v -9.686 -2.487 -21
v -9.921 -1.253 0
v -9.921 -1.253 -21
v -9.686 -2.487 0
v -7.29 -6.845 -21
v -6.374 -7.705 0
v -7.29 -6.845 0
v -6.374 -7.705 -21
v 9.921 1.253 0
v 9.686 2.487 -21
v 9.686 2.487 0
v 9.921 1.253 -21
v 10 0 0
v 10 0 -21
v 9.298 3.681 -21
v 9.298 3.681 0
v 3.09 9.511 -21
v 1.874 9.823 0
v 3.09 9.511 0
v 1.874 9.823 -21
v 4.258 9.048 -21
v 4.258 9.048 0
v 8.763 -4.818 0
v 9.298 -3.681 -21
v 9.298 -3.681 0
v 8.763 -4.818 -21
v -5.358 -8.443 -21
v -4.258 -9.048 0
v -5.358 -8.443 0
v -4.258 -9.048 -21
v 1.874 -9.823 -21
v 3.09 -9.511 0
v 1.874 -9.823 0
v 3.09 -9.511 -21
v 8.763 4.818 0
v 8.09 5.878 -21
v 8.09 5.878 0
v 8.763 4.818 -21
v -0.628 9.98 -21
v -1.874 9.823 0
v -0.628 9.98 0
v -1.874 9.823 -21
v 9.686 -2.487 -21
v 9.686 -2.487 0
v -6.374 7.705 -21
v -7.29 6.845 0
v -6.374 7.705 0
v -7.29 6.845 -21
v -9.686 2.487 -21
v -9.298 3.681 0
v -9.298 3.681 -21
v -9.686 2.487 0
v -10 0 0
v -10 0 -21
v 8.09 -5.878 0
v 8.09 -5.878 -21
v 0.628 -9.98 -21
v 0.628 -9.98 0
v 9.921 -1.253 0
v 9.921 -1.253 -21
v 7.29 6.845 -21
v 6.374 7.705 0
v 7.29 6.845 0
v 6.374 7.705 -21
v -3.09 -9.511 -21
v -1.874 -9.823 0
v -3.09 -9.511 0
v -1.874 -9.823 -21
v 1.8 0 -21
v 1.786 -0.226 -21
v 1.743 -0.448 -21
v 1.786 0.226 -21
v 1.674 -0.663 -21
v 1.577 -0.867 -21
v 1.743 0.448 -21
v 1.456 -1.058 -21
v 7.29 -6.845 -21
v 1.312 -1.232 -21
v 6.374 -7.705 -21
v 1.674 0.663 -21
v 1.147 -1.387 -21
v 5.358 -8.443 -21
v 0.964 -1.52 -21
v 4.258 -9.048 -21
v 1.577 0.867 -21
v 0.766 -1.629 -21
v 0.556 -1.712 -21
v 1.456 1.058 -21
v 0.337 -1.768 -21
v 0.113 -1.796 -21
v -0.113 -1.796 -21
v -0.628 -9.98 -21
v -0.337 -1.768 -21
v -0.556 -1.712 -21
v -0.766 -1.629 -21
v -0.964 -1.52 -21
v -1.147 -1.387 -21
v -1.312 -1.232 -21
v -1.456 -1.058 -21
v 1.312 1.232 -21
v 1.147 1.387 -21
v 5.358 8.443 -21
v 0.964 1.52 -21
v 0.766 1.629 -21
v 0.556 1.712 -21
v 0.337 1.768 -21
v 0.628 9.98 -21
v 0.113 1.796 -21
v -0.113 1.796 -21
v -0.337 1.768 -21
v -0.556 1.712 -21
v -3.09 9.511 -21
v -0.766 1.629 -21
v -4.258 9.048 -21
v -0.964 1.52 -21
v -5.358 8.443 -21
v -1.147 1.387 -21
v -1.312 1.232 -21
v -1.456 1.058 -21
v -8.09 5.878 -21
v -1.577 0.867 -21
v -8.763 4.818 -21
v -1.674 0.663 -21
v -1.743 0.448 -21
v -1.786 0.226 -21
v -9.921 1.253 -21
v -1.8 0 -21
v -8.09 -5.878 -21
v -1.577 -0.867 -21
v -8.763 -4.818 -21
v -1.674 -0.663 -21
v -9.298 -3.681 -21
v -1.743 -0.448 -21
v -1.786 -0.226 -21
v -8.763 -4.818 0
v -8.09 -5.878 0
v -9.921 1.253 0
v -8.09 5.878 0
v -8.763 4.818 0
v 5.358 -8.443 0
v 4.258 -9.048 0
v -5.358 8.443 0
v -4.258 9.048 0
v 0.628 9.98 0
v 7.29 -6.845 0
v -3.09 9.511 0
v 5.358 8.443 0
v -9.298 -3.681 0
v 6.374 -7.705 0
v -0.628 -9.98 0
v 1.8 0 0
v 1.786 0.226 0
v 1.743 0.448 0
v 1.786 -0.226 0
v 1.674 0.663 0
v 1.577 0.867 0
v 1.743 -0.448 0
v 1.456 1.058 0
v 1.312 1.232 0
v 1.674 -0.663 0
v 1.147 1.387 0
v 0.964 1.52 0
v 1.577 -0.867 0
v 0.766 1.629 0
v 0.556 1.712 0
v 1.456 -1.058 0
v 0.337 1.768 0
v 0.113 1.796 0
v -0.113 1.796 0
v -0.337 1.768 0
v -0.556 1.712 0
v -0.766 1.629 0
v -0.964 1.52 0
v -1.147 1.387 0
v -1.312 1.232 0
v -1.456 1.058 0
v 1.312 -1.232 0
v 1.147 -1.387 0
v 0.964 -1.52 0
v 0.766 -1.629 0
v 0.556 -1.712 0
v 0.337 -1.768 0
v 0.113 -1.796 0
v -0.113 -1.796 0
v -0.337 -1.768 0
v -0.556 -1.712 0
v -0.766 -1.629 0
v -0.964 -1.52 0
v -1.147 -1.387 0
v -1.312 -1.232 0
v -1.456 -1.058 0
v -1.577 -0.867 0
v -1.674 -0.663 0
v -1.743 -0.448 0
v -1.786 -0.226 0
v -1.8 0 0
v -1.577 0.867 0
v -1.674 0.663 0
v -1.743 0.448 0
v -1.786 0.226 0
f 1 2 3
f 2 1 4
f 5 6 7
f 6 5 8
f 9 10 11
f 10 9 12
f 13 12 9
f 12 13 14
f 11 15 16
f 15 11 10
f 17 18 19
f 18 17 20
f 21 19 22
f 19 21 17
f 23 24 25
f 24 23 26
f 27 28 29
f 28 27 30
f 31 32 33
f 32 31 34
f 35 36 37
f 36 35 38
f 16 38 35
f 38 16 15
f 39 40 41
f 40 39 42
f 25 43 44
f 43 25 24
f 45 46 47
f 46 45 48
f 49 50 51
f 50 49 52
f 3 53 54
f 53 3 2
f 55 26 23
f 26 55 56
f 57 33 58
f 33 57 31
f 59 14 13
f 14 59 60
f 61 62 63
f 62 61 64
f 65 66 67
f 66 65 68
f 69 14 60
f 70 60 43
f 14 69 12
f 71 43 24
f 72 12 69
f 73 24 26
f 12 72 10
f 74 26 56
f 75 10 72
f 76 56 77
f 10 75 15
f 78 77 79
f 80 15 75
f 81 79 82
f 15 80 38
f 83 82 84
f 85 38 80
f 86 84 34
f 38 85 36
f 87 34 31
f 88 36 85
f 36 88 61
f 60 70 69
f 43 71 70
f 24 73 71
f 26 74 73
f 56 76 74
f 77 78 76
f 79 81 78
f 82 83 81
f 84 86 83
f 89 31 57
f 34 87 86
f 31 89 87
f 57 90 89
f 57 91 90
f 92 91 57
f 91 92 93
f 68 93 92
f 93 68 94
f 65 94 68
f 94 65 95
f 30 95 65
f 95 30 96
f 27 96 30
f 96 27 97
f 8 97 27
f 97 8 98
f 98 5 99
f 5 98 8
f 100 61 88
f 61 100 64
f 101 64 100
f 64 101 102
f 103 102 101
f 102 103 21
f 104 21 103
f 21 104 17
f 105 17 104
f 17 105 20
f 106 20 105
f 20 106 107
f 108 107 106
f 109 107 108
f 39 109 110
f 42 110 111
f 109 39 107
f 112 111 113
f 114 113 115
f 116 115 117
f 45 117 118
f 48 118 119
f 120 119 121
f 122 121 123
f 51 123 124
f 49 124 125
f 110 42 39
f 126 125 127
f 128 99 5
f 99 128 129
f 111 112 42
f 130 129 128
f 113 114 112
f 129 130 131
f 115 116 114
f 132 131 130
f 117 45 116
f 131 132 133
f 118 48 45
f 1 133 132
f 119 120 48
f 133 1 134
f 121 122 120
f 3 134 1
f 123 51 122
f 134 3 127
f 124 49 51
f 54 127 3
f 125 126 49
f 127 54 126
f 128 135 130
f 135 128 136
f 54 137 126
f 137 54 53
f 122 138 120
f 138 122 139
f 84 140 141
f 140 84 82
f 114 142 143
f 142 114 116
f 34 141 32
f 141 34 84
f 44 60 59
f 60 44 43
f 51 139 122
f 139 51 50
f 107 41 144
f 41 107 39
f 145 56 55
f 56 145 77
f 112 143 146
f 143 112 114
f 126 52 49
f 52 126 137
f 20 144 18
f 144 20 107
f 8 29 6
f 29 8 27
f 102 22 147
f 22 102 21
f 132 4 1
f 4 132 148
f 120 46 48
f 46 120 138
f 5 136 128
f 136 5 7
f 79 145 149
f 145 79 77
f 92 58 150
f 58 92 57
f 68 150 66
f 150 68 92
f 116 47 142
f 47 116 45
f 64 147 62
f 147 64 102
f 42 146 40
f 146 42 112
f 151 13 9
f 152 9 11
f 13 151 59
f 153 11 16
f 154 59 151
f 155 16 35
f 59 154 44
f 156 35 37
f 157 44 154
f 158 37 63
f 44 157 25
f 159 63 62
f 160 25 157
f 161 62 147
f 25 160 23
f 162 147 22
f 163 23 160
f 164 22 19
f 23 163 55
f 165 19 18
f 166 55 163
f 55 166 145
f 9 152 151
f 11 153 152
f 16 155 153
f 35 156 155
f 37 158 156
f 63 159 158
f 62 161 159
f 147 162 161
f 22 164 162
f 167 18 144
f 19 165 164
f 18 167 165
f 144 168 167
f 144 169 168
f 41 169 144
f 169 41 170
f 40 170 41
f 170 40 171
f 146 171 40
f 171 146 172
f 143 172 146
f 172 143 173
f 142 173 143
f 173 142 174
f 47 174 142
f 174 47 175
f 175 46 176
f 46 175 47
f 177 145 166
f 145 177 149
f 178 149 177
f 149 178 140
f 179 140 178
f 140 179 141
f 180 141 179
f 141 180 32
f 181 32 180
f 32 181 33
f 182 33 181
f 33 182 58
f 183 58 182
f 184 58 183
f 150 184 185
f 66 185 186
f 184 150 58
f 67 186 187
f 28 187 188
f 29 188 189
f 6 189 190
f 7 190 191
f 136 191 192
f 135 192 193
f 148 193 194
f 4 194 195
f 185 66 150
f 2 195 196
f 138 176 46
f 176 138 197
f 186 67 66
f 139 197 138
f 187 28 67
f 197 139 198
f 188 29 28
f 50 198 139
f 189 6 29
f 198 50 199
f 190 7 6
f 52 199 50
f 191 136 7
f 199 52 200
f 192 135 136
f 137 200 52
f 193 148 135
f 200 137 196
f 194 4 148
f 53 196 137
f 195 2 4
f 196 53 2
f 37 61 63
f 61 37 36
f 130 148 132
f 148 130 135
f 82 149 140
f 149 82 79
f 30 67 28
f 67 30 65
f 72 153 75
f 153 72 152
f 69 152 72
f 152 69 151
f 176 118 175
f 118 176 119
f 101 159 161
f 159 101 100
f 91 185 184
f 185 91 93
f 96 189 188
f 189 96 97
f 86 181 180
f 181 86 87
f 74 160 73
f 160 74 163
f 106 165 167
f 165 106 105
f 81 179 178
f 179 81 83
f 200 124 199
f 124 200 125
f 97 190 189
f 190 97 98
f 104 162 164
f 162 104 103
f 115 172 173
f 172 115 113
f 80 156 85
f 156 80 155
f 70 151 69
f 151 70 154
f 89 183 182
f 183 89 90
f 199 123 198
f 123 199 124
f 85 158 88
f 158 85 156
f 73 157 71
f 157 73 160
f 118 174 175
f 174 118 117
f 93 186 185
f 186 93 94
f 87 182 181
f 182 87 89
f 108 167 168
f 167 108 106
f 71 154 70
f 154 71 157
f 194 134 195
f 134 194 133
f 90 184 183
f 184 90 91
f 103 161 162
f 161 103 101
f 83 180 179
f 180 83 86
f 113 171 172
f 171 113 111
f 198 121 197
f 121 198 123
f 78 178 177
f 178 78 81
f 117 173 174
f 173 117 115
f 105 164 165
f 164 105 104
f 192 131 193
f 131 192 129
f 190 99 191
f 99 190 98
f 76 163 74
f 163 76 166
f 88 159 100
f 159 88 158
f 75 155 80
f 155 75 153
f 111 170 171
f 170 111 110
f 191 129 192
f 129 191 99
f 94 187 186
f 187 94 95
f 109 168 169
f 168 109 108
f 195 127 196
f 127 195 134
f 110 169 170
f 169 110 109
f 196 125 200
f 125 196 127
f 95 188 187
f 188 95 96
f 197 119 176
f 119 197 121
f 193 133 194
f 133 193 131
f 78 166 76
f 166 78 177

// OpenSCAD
$fn = 50;


difference() {
	union() {
		translate(v = [0, 0, -21.0000000000]) {
			cylinder(h = 21, r = 10.0000000000);
		}
		cylinder(h = 0, r = 13.0000000000);
	}
	union() {
		#translate(v = [0, 0, -21]) {
			cylinder(h = 21, r = 1.8000000000);
		}
	}
}
